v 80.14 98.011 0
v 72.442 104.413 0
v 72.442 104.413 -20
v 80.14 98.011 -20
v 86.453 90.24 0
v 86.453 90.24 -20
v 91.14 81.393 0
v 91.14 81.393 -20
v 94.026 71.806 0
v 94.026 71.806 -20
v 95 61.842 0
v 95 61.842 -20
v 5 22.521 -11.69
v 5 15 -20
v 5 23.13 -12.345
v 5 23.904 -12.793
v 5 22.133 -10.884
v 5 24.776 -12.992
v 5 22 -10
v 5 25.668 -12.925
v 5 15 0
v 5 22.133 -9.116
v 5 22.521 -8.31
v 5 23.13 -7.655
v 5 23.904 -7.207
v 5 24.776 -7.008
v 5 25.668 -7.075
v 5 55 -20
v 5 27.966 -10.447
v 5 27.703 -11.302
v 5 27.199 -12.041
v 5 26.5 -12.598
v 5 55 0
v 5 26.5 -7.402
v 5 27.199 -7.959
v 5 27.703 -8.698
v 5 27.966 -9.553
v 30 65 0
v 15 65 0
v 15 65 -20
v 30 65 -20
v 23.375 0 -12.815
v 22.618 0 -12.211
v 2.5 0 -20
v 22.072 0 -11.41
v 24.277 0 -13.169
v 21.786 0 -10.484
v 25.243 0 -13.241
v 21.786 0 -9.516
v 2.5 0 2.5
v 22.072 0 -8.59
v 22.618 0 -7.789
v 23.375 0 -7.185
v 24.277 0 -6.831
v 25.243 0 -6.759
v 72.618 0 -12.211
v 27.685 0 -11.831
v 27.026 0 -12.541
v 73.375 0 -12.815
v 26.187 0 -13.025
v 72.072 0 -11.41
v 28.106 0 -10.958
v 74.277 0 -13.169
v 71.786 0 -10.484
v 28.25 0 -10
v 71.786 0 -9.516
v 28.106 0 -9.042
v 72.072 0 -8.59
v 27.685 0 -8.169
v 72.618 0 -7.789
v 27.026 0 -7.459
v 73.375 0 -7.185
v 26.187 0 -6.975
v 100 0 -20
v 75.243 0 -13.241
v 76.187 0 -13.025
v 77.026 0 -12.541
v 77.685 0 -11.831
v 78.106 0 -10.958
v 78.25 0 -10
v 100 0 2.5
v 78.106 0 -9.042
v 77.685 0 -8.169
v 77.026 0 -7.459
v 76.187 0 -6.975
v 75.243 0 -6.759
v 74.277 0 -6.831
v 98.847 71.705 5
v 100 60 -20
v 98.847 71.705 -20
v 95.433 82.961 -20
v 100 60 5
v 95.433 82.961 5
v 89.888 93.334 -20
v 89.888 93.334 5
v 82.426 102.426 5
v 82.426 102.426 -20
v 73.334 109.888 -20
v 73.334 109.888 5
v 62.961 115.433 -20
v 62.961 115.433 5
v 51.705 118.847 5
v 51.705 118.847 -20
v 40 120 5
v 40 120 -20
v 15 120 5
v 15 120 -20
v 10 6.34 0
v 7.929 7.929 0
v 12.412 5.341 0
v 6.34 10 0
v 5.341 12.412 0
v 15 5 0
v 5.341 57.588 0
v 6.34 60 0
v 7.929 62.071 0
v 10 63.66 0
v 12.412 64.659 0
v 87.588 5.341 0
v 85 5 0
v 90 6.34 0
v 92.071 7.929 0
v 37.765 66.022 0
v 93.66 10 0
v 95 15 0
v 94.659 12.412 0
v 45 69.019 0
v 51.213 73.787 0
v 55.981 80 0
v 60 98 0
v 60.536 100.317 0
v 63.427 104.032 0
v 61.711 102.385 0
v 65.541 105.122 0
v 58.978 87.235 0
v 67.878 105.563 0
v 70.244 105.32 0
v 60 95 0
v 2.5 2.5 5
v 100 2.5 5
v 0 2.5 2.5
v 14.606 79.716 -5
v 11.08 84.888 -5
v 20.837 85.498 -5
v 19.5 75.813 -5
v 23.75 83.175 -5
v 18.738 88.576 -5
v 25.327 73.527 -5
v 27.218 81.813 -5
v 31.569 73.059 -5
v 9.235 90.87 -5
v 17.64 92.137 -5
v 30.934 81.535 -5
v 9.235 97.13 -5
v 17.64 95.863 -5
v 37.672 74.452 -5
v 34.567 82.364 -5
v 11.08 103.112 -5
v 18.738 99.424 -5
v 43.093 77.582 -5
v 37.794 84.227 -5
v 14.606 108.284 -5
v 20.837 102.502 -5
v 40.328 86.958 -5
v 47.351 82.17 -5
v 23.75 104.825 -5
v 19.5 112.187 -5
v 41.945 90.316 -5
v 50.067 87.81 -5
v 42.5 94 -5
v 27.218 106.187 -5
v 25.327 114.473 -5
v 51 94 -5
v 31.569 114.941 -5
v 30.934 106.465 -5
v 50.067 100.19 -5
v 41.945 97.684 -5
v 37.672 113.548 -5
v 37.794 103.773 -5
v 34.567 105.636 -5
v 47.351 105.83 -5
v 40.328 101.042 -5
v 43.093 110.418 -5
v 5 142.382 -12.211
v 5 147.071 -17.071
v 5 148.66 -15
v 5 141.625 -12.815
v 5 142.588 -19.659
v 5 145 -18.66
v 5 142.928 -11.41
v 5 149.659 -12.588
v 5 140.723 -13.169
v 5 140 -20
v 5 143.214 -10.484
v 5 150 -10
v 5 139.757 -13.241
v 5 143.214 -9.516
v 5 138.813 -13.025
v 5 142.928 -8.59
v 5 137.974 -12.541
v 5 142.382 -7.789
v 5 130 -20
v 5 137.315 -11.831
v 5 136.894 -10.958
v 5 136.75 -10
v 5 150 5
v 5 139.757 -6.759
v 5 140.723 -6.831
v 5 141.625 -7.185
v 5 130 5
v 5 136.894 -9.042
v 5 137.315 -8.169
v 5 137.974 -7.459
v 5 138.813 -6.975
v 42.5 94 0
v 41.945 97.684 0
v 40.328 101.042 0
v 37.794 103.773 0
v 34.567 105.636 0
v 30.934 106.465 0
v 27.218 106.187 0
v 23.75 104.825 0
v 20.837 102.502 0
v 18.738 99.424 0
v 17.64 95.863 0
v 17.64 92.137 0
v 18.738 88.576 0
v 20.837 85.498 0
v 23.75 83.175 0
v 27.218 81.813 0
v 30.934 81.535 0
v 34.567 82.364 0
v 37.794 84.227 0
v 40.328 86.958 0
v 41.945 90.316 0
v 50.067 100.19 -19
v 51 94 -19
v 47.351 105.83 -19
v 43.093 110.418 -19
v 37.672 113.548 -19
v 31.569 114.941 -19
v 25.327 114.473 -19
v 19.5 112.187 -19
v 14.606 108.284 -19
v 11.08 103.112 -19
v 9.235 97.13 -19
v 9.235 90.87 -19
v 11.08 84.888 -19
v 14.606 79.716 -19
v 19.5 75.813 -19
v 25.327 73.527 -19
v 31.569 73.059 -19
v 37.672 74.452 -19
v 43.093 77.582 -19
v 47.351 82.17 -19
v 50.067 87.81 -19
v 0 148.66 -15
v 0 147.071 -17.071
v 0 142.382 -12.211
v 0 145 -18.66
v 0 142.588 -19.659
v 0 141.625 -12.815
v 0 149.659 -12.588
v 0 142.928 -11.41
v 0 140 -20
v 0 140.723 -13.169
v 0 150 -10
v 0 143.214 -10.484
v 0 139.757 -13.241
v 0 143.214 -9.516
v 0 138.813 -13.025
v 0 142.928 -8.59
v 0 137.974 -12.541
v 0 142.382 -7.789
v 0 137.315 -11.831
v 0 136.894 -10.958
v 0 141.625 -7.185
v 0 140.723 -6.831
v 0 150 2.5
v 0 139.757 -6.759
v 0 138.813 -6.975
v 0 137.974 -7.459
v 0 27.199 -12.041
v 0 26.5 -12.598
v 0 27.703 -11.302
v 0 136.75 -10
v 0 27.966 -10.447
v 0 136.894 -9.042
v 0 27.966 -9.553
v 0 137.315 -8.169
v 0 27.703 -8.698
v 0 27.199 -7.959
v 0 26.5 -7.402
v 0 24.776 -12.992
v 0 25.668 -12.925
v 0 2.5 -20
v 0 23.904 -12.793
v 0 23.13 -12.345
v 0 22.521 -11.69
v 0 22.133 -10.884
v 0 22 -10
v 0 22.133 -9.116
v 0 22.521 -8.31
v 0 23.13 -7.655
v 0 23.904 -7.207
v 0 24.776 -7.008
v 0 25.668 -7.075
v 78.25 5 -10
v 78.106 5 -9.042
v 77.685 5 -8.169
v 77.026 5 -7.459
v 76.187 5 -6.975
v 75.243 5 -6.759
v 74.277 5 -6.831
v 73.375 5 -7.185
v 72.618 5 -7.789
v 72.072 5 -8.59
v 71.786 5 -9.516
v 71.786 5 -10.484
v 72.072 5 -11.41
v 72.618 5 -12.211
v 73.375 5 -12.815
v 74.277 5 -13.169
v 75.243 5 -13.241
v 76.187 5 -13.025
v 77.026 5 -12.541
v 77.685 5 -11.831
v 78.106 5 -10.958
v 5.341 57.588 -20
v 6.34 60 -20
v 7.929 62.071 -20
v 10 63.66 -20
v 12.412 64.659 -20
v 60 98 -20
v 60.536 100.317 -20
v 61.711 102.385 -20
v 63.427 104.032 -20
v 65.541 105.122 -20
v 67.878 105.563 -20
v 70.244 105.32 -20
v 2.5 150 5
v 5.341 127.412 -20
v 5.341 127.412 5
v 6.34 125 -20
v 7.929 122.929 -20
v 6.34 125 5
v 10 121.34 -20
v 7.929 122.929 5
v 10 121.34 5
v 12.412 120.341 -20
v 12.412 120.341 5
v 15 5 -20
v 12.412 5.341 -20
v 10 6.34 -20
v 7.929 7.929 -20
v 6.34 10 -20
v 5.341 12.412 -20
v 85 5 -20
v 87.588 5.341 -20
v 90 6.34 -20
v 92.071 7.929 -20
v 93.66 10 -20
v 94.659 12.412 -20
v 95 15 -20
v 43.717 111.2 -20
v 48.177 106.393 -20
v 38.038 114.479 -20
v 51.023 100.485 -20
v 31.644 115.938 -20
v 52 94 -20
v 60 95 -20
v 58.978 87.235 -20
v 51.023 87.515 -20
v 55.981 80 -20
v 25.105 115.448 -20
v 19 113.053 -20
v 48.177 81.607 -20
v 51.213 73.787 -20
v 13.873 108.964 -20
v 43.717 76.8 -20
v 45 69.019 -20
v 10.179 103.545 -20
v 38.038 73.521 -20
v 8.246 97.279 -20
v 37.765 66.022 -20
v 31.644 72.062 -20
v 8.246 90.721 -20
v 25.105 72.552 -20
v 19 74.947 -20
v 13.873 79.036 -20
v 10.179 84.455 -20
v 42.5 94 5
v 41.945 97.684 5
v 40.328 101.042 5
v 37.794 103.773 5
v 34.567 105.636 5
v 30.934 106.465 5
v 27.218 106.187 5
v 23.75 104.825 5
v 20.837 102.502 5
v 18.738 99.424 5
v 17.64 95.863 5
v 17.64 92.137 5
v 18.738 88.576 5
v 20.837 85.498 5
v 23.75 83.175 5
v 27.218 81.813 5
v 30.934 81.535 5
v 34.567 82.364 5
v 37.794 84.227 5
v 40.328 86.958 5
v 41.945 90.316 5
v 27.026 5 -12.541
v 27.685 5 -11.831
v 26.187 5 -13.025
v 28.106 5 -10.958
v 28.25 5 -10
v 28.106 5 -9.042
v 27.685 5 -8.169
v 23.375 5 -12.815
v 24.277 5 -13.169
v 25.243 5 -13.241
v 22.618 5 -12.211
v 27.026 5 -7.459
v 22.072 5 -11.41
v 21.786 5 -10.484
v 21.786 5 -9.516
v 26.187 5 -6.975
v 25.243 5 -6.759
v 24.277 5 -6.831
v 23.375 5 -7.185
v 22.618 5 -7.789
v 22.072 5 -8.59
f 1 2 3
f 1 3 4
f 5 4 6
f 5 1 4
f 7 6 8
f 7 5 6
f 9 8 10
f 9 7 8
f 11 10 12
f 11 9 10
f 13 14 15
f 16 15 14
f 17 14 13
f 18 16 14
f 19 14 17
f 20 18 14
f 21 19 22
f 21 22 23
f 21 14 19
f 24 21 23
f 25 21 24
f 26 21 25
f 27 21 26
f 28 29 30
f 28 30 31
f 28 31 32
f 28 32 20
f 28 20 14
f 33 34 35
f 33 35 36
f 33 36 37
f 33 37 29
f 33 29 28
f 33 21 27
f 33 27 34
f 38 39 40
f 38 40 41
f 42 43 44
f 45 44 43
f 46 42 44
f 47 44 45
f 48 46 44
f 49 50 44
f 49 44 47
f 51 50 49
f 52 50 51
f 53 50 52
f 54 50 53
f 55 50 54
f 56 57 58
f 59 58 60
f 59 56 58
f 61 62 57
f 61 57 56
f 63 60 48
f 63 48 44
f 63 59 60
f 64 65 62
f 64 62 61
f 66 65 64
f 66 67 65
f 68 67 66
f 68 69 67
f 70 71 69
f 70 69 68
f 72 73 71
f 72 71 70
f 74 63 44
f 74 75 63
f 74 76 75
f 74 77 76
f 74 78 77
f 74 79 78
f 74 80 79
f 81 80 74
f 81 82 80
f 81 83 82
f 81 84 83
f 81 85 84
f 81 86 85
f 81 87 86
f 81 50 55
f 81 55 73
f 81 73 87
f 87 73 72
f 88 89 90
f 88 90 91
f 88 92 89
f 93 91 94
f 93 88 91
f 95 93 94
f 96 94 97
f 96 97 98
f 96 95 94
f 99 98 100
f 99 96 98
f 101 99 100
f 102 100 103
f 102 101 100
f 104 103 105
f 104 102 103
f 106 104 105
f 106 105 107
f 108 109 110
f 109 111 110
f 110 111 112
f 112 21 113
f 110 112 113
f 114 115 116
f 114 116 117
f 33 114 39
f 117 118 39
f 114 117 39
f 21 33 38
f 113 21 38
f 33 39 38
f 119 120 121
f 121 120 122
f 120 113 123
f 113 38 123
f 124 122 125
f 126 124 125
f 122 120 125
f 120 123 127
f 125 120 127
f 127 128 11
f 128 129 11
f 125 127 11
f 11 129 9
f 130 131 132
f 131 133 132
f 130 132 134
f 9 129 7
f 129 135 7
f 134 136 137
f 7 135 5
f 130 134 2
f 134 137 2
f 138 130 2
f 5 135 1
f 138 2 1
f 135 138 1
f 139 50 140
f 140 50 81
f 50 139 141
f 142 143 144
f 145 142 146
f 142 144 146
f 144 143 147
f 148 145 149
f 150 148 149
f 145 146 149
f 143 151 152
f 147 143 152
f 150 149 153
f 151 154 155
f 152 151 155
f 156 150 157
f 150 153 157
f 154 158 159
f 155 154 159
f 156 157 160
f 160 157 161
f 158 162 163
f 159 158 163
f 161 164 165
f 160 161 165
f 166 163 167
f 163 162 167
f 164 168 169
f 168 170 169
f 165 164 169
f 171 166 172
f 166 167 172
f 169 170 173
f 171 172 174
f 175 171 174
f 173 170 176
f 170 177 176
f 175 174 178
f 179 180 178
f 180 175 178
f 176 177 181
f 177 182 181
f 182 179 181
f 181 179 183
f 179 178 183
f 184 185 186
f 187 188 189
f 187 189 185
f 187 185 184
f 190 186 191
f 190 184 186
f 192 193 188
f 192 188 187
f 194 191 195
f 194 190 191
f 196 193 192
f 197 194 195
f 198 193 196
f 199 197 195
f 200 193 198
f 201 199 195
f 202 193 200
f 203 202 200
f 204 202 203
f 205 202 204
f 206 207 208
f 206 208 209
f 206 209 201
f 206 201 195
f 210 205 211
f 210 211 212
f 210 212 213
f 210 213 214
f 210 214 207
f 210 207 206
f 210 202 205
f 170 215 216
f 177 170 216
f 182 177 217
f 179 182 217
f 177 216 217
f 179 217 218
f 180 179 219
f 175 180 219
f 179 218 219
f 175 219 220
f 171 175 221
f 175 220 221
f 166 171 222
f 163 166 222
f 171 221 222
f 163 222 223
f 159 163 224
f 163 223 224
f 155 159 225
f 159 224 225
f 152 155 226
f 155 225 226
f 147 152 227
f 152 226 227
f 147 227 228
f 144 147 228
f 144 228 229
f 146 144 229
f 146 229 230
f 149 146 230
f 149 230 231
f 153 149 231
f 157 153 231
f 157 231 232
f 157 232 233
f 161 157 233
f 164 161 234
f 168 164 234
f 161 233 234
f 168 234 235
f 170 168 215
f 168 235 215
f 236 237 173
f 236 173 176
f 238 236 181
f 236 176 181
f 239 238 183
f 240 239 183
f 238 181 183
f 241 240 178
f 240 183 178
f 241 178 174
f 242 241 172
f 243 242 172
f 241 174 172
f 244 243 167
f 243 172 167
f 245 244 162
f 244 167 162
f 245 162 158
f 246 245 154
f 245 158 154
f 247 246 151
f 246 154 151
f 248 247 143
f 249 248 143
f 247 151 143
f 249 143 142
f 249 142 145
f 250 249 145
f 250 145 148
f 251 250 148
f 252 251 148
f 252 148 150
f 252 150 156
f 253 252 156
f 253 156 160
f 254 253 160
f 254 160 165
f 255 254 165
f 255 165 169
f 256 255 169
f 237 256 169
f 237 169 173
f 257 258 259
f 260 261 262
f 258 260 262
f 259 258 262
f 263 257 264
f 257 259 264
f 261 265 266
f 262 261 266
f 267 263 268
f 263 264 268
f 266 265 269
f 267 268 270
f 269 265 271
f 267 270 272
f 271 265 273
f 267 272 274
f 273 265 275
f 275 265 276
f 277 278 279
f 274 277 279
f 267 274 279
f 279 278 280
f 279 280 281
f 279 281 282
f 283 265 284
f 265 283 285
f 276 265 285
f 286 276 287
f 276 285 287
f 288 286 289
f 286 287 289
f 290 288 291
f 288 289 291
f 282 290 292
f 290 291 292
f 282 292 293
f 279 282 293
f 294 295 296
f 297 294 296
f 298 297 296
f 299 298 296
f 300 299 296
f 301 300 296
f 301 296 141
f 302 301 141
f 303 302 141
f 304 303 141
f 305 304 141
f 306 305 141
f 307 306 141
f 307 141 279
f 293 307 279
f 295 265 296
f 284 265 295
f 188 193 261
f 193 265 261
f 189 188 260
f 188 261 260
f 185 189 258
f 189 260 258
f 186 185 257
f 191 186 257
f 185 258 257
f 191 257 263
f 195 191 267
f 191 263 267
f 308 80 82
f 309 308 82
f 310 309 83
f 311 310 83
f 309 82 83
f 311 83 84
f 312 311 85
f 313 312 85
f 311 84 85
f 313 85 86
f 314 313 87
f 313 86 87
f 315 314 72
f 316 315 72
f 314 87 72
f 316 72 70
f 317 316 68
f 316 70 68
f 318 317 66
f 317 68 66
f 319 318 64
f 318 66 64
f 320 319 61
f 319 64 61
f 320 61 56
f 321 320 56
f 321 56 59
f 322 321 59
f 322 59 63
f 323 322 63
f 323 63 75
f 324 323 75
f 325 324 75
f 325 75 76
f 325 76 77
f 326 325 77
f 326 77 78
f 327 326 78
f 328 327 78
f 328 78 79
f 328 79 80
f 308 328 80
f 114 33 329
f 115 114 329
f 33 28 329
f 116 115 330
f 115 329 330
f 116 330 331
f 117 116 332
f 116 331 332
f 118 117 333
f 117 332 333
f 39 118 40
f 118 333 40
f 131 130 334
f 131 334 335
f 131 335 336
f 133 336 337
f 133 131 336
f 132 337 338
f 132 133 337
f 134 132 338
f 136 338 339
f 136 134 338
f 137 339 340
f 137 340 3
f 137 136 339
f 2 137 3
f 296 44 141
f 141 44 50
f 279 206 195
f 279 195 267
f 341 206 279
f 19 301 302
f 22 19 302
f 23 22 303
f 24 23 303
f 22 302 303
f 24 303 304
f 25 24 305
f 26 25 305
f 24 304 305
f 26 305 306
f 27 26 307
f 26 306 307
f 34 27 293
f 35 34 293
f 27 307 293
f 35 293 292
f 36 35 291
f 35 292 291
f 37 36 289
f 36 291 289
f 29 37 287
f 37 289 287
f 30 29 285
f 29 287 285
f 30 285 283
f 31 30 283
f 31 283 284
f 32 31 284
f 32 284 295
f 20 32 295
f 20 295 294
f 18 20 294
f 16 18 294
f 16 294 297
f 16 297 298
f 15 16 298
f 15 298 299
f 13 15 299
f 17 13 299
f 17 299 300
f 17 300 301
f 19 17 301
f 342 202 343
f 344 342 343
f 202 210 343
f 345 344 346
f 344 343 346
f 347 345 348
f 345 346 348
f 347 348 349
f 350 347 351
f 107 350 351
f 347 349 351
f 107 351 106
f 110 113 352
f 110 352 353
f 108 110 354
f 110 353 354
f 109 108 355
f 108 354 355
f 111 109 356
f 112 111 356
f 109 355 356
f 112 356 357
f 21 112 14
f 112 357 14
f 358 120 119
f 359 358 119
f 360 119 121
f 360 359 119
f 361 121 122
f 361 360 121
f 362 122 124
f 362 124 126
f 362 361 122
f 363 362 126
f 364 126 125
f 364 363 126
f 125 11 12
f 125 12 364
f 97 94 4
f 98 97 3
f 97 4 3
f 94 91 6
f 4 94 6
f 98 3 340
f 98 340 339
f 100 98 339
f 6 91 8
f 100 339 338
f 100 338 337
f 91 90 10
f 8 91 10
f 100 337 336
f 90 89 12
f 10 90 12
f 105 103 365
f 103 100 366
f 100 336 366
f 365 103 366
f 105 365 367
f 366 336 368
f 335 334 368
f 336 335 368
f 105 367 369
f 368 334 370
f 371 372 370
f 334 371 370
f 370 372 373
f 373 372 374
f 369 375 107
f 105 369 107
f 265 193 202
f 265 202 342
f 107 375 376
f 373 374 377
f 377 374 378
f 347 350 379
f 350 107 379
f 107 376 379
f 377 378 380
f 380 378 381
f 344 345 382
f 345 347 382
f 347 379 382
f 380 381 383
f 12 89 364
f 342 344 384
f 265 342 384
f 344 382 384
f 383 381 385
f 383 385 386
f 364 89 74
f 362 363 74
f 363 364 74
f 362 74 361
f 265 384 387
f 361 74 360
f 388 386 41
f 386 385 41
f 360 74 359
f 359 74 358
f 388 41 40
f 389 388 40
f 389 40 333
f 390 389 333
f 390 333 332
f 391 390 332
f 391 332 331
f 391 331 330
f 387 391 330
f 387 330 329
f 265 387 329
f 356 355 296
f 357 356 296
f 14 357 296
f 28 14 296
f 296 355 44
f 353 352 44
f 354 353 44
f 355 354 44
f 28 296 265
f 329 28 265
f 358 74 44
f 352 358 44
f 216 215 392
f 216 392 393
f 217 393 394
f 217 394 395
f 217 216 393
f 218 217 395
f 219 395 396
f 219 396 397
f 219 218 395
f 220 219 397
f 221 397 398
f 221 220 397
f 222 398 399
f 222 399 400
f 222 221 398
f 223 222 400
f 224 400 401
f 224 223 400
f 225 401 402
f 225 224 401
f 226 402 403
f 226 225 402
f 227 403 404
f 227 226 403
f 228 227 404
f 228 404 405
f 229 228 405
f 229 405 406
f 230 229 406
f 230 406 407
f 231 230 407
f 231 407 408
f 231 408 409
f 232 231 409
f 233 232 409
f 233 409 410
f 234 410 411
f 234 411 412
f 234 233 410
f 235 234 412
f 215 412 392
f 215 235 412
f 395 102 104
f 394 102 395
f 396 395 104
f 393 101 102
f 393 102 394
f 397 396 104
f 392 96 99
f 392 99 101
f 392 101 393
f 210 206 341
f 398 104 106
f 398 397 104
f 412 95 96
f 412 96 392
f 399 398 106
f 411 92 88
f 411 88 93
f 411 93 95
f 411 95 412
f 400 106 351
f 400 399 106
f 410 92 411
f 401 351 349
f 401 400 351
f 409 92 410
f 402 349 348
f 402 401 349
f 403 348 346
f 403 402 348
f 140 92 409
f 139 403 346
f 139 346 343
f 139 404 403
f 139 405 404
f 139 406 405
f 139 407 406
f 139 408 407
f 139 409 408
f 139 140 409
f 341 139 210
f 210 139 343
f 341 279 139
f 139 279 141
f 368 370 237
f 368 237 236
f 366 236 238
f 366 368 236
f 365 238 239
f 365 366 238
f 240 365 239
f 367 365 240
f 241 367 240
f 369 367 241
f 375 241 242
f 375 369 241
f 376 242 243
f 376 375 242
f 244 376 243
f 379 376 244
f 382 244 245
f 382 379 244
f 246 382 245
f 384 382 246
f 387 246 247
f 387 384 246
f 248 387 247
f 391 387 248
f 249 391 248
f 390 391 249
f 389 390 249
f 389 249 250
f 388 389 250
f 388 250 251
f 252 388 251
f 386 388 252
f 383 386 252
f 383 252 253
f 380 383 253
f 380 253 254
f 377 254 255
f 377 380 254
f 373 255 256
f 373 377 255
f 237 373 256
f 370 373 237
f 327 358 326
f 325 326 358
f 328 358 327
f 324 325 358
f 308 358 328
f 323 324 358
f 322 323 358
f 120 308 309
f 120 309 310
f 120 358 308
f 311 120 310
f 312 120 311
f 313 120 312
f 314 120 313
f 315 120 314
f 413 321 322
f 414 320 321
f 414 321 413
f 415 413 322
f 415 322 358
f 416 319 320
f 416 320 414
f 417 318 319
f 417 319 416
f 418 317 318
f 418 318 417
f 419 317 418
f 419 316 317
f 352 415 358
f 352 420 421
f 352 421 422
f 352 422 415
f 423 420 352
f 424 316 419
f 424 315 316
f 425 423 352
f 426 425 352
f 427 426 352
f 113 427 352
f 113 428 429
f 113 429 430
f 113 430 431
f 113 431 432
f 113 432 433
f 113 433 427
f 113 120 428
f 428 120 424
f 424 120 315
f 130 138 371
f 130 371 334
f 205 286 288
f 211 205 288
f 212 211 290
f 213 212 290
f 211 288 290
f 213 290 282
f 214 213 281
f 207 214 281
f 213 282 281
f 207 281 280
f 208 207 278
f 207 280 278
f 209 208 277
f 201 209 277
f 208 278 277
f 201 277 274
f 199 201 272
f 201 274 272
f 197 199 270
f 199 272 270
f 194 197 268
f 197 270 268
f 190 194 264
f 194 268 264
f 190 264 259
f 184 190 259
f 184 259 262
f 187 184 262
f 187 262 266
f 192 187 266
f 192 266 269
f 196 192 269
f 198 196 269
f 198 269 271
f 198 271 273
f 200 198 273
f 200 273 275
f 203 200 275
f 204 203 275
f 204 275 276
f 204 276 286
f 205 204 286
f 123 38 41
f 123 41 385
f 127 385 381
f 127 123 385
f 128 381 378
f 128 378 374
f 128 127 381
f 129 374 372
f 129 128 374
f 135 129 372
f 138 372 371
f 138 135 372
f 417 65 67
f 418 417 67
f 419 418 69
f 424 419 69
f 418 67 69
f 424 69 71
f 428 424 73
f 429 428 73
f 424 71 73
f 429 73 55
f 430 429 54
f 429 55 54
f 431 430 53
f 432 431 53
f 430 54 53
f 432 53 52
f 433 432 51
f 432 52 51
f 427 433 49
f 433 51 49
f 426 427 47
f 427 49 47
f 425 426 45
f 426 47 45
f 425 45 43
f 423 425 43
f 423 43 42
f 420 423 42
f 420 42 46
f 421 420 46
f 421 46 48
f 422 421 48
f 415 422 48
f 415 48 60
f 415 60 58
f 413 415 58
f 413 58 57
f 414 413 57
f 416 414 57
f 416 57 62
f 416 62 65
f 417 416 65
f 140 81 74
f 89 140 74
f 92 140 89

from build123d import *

# Parameters (mm, degrees)
F0_R      = 21
F0_R_2    = 12.5
F1_DEPTH  = 5
F2_DEPTH  = 20
F3_W      = 5
F3_H      = 25
F4_DEPTH  = 30
F6_R      = 3.25
F7_DEPTH  = 25
F5_R      = 3
F5_R_2    = 3.25
F8_DEPTH  = 25
F9_SIZE   = 2.5
F10_R     = 10
F11_DEPTH = 5
F12_SIZE  = 1


# Not quite as in the source:
# - a feature names something its author has since deleted; it is built from what else it names


with BuildPart() as f1:
    # F0 (on Top) → F1 (new body)
    with BuildSketch(Plane.XY):
        with BuildLine():
            Line((30, 65), (5, 65))
            Line((5, 65), (5, 5))
            Line((5, 5), (95, 5))
            Line((95, 5), (95, 61.8416720113))
            ThreePointArc((95, 61.8416720113), (89.0121465356, 85.9307991151), (72.4423646792, 104.4127568838))
            ThreePointArc((72.4423646792, 104.4127568838), (64.4445964825, 104.6534027902), (60, 98))
            Line((60, 98), (60, 95))
            ThreePointArc((60, 95), (51.2132034356, 73.7867965644), (30, 65))
        make_face()
        with BuildLine():
            Line((40, 120), (5, 120))
            Line((5, 120), (5, 65))
            Line((5, 65), (30, 65))
            ThreePointArc((30, 65), (51.2132034356, 73.7867965644), (60, 95))
            Line((60, 95), (60, 98))
            ThreePointArc((60, 98), (64.4445964825, 104.6534027902), (72.4423646792, 104.4127568838))
            ThreePointArc((72.4423646792, 104.4127568838), (89.0121465356, 85.9307991151), (95, 61.8416720113))
            Line((95, 61.8416720113), (95, 5))
            Line((95, 5), (100, 5))
            Line((100, 5), (100, 60))
            ThreePointArc((100, 60), (82.4264068712, 102.4264068712), (40, 120))
        make_face()
        with Locations((30, 94)):
            Circle(F0_R, mode=Mode.SUBTRACT)
        with Locations((30, 94)):
            Circle(F0_R)
        with Locations((30, 94)):
            Circle(F0_R_2, mode=Mode.SUBTRACT)
        Polygon((0, 120), (0, 0), (100, 0), (100, 5), (95, 5), (5, 5), (5, 65), (5, 120), align=None)
    extrude(amount=F1_DEPTH)

    # F0 (on Top) → F2 (join)
    with BuildSketch(Plane.XY):
        Polygon((0, 120), (0, 0), (100, 0), (100, 5), (95, 5), (5, 5), (5, 65), (5, 120), align=None)
        with BuildLine():
            Line((40, 120), (5, 120))
            Line((5, 120), (5, 65))
            Line((5, 65), (30, 65))
            ThreePointArc((30, 65), (51.2132034356, 73.7867965644), (60, 95))
            Line((60, 95), (60, 98))
            ThreePointArc((60, 98), (64.4445964825, 104.6534027902), (72.4423646792, 104.4127568838))
            ThreePointArc((72.4423646792, 104.4127568838), (89.0121465356, 85.9307991151), (95, 61.8416720113))
            Line((95, 61.8416720113), (95, 5))
            Line((95, 5), (100, 5))
            Line((100, 5), (100, 60))
            ThreePointArc((100, 60), (82.4264068712, 102.4264068712), (40, 120))
        make_face()
        with Locations((30, 94)):
            Circle(F0_R, mode=Mode.SUBTRACT)
    extrude(amount=-F2_DEPTH)

    # F3 (on face) → F4 (join)
    with BuildSketch(Plane(origin=(0, 120, 0), x_dir=(-1, 0, 0), z_dir=(0, 1, 0))):
        with Locations((-2.5, -7.5)):
            Rectangle(F3_W, F3_H)
    extrude(amount=F4_DEPTH)

    # F6 (on face) → F7 (cut)
    with BuildSketch(Plane.XZ):
        with Locations((25, -10)):
            Circle(F6_R)
        with Locations((75, -10)):
            Circle(F6_R)
    extrude(amount=-F7_DEPTH, mode=Mode.SUBTRACT)

    # F5 (on face) → F8 (cut)
    with BuildSketch(Plane(origin=(0, 0, 0), x_dir=(0, -1, 0), z_dir=(-1, 0, 0))):
        with Locations((-25, -10)):
            Circle(F5_R)
        with Locations((-140, -10)):
            Circle(F5_R_2)
    extrude(amount=-F8_DEPTH, mode=Mode.SUBTRACT)

    # F9
    f9_edges = [f1.edges().sort_by_distance(p)[0] for p in [
        (50, 0, 5),
        (0, 75, 5),
        (0, 0, -7.5),
    ]]
    chamfer(f9_edges, length=F9_SIZE)

    # F10
    f10_edges = [f1.edges().sort_by_distance(p)[0] for p in [
        (5, 5, -10),
        (95, 5, -10),
        (5, 65, -10),
        (5, 120, -7.5),
        (2.5, 150, -20),
    ]]
    fillet(f10_edges, radius=F10_R)

    # F0 (on Top) → F11 (join)
    with BuildSketch(Plane.XY):
        with Locations((30, 94)):
            Circle(F0_R)
        with Locations((30, 94)):
            Circle(F0_R_2, mode=Mode.SUBTRACT)
    extrude(amount=-F11_DEPTH)

    # F12
    f12_edges = [f1.edges().sort_by_distance(p)[0] for p in [
        (9, 94, -20),
    ]]
    chamfer(f12_edges, length=F12_SIZE)


solid = f1.part
